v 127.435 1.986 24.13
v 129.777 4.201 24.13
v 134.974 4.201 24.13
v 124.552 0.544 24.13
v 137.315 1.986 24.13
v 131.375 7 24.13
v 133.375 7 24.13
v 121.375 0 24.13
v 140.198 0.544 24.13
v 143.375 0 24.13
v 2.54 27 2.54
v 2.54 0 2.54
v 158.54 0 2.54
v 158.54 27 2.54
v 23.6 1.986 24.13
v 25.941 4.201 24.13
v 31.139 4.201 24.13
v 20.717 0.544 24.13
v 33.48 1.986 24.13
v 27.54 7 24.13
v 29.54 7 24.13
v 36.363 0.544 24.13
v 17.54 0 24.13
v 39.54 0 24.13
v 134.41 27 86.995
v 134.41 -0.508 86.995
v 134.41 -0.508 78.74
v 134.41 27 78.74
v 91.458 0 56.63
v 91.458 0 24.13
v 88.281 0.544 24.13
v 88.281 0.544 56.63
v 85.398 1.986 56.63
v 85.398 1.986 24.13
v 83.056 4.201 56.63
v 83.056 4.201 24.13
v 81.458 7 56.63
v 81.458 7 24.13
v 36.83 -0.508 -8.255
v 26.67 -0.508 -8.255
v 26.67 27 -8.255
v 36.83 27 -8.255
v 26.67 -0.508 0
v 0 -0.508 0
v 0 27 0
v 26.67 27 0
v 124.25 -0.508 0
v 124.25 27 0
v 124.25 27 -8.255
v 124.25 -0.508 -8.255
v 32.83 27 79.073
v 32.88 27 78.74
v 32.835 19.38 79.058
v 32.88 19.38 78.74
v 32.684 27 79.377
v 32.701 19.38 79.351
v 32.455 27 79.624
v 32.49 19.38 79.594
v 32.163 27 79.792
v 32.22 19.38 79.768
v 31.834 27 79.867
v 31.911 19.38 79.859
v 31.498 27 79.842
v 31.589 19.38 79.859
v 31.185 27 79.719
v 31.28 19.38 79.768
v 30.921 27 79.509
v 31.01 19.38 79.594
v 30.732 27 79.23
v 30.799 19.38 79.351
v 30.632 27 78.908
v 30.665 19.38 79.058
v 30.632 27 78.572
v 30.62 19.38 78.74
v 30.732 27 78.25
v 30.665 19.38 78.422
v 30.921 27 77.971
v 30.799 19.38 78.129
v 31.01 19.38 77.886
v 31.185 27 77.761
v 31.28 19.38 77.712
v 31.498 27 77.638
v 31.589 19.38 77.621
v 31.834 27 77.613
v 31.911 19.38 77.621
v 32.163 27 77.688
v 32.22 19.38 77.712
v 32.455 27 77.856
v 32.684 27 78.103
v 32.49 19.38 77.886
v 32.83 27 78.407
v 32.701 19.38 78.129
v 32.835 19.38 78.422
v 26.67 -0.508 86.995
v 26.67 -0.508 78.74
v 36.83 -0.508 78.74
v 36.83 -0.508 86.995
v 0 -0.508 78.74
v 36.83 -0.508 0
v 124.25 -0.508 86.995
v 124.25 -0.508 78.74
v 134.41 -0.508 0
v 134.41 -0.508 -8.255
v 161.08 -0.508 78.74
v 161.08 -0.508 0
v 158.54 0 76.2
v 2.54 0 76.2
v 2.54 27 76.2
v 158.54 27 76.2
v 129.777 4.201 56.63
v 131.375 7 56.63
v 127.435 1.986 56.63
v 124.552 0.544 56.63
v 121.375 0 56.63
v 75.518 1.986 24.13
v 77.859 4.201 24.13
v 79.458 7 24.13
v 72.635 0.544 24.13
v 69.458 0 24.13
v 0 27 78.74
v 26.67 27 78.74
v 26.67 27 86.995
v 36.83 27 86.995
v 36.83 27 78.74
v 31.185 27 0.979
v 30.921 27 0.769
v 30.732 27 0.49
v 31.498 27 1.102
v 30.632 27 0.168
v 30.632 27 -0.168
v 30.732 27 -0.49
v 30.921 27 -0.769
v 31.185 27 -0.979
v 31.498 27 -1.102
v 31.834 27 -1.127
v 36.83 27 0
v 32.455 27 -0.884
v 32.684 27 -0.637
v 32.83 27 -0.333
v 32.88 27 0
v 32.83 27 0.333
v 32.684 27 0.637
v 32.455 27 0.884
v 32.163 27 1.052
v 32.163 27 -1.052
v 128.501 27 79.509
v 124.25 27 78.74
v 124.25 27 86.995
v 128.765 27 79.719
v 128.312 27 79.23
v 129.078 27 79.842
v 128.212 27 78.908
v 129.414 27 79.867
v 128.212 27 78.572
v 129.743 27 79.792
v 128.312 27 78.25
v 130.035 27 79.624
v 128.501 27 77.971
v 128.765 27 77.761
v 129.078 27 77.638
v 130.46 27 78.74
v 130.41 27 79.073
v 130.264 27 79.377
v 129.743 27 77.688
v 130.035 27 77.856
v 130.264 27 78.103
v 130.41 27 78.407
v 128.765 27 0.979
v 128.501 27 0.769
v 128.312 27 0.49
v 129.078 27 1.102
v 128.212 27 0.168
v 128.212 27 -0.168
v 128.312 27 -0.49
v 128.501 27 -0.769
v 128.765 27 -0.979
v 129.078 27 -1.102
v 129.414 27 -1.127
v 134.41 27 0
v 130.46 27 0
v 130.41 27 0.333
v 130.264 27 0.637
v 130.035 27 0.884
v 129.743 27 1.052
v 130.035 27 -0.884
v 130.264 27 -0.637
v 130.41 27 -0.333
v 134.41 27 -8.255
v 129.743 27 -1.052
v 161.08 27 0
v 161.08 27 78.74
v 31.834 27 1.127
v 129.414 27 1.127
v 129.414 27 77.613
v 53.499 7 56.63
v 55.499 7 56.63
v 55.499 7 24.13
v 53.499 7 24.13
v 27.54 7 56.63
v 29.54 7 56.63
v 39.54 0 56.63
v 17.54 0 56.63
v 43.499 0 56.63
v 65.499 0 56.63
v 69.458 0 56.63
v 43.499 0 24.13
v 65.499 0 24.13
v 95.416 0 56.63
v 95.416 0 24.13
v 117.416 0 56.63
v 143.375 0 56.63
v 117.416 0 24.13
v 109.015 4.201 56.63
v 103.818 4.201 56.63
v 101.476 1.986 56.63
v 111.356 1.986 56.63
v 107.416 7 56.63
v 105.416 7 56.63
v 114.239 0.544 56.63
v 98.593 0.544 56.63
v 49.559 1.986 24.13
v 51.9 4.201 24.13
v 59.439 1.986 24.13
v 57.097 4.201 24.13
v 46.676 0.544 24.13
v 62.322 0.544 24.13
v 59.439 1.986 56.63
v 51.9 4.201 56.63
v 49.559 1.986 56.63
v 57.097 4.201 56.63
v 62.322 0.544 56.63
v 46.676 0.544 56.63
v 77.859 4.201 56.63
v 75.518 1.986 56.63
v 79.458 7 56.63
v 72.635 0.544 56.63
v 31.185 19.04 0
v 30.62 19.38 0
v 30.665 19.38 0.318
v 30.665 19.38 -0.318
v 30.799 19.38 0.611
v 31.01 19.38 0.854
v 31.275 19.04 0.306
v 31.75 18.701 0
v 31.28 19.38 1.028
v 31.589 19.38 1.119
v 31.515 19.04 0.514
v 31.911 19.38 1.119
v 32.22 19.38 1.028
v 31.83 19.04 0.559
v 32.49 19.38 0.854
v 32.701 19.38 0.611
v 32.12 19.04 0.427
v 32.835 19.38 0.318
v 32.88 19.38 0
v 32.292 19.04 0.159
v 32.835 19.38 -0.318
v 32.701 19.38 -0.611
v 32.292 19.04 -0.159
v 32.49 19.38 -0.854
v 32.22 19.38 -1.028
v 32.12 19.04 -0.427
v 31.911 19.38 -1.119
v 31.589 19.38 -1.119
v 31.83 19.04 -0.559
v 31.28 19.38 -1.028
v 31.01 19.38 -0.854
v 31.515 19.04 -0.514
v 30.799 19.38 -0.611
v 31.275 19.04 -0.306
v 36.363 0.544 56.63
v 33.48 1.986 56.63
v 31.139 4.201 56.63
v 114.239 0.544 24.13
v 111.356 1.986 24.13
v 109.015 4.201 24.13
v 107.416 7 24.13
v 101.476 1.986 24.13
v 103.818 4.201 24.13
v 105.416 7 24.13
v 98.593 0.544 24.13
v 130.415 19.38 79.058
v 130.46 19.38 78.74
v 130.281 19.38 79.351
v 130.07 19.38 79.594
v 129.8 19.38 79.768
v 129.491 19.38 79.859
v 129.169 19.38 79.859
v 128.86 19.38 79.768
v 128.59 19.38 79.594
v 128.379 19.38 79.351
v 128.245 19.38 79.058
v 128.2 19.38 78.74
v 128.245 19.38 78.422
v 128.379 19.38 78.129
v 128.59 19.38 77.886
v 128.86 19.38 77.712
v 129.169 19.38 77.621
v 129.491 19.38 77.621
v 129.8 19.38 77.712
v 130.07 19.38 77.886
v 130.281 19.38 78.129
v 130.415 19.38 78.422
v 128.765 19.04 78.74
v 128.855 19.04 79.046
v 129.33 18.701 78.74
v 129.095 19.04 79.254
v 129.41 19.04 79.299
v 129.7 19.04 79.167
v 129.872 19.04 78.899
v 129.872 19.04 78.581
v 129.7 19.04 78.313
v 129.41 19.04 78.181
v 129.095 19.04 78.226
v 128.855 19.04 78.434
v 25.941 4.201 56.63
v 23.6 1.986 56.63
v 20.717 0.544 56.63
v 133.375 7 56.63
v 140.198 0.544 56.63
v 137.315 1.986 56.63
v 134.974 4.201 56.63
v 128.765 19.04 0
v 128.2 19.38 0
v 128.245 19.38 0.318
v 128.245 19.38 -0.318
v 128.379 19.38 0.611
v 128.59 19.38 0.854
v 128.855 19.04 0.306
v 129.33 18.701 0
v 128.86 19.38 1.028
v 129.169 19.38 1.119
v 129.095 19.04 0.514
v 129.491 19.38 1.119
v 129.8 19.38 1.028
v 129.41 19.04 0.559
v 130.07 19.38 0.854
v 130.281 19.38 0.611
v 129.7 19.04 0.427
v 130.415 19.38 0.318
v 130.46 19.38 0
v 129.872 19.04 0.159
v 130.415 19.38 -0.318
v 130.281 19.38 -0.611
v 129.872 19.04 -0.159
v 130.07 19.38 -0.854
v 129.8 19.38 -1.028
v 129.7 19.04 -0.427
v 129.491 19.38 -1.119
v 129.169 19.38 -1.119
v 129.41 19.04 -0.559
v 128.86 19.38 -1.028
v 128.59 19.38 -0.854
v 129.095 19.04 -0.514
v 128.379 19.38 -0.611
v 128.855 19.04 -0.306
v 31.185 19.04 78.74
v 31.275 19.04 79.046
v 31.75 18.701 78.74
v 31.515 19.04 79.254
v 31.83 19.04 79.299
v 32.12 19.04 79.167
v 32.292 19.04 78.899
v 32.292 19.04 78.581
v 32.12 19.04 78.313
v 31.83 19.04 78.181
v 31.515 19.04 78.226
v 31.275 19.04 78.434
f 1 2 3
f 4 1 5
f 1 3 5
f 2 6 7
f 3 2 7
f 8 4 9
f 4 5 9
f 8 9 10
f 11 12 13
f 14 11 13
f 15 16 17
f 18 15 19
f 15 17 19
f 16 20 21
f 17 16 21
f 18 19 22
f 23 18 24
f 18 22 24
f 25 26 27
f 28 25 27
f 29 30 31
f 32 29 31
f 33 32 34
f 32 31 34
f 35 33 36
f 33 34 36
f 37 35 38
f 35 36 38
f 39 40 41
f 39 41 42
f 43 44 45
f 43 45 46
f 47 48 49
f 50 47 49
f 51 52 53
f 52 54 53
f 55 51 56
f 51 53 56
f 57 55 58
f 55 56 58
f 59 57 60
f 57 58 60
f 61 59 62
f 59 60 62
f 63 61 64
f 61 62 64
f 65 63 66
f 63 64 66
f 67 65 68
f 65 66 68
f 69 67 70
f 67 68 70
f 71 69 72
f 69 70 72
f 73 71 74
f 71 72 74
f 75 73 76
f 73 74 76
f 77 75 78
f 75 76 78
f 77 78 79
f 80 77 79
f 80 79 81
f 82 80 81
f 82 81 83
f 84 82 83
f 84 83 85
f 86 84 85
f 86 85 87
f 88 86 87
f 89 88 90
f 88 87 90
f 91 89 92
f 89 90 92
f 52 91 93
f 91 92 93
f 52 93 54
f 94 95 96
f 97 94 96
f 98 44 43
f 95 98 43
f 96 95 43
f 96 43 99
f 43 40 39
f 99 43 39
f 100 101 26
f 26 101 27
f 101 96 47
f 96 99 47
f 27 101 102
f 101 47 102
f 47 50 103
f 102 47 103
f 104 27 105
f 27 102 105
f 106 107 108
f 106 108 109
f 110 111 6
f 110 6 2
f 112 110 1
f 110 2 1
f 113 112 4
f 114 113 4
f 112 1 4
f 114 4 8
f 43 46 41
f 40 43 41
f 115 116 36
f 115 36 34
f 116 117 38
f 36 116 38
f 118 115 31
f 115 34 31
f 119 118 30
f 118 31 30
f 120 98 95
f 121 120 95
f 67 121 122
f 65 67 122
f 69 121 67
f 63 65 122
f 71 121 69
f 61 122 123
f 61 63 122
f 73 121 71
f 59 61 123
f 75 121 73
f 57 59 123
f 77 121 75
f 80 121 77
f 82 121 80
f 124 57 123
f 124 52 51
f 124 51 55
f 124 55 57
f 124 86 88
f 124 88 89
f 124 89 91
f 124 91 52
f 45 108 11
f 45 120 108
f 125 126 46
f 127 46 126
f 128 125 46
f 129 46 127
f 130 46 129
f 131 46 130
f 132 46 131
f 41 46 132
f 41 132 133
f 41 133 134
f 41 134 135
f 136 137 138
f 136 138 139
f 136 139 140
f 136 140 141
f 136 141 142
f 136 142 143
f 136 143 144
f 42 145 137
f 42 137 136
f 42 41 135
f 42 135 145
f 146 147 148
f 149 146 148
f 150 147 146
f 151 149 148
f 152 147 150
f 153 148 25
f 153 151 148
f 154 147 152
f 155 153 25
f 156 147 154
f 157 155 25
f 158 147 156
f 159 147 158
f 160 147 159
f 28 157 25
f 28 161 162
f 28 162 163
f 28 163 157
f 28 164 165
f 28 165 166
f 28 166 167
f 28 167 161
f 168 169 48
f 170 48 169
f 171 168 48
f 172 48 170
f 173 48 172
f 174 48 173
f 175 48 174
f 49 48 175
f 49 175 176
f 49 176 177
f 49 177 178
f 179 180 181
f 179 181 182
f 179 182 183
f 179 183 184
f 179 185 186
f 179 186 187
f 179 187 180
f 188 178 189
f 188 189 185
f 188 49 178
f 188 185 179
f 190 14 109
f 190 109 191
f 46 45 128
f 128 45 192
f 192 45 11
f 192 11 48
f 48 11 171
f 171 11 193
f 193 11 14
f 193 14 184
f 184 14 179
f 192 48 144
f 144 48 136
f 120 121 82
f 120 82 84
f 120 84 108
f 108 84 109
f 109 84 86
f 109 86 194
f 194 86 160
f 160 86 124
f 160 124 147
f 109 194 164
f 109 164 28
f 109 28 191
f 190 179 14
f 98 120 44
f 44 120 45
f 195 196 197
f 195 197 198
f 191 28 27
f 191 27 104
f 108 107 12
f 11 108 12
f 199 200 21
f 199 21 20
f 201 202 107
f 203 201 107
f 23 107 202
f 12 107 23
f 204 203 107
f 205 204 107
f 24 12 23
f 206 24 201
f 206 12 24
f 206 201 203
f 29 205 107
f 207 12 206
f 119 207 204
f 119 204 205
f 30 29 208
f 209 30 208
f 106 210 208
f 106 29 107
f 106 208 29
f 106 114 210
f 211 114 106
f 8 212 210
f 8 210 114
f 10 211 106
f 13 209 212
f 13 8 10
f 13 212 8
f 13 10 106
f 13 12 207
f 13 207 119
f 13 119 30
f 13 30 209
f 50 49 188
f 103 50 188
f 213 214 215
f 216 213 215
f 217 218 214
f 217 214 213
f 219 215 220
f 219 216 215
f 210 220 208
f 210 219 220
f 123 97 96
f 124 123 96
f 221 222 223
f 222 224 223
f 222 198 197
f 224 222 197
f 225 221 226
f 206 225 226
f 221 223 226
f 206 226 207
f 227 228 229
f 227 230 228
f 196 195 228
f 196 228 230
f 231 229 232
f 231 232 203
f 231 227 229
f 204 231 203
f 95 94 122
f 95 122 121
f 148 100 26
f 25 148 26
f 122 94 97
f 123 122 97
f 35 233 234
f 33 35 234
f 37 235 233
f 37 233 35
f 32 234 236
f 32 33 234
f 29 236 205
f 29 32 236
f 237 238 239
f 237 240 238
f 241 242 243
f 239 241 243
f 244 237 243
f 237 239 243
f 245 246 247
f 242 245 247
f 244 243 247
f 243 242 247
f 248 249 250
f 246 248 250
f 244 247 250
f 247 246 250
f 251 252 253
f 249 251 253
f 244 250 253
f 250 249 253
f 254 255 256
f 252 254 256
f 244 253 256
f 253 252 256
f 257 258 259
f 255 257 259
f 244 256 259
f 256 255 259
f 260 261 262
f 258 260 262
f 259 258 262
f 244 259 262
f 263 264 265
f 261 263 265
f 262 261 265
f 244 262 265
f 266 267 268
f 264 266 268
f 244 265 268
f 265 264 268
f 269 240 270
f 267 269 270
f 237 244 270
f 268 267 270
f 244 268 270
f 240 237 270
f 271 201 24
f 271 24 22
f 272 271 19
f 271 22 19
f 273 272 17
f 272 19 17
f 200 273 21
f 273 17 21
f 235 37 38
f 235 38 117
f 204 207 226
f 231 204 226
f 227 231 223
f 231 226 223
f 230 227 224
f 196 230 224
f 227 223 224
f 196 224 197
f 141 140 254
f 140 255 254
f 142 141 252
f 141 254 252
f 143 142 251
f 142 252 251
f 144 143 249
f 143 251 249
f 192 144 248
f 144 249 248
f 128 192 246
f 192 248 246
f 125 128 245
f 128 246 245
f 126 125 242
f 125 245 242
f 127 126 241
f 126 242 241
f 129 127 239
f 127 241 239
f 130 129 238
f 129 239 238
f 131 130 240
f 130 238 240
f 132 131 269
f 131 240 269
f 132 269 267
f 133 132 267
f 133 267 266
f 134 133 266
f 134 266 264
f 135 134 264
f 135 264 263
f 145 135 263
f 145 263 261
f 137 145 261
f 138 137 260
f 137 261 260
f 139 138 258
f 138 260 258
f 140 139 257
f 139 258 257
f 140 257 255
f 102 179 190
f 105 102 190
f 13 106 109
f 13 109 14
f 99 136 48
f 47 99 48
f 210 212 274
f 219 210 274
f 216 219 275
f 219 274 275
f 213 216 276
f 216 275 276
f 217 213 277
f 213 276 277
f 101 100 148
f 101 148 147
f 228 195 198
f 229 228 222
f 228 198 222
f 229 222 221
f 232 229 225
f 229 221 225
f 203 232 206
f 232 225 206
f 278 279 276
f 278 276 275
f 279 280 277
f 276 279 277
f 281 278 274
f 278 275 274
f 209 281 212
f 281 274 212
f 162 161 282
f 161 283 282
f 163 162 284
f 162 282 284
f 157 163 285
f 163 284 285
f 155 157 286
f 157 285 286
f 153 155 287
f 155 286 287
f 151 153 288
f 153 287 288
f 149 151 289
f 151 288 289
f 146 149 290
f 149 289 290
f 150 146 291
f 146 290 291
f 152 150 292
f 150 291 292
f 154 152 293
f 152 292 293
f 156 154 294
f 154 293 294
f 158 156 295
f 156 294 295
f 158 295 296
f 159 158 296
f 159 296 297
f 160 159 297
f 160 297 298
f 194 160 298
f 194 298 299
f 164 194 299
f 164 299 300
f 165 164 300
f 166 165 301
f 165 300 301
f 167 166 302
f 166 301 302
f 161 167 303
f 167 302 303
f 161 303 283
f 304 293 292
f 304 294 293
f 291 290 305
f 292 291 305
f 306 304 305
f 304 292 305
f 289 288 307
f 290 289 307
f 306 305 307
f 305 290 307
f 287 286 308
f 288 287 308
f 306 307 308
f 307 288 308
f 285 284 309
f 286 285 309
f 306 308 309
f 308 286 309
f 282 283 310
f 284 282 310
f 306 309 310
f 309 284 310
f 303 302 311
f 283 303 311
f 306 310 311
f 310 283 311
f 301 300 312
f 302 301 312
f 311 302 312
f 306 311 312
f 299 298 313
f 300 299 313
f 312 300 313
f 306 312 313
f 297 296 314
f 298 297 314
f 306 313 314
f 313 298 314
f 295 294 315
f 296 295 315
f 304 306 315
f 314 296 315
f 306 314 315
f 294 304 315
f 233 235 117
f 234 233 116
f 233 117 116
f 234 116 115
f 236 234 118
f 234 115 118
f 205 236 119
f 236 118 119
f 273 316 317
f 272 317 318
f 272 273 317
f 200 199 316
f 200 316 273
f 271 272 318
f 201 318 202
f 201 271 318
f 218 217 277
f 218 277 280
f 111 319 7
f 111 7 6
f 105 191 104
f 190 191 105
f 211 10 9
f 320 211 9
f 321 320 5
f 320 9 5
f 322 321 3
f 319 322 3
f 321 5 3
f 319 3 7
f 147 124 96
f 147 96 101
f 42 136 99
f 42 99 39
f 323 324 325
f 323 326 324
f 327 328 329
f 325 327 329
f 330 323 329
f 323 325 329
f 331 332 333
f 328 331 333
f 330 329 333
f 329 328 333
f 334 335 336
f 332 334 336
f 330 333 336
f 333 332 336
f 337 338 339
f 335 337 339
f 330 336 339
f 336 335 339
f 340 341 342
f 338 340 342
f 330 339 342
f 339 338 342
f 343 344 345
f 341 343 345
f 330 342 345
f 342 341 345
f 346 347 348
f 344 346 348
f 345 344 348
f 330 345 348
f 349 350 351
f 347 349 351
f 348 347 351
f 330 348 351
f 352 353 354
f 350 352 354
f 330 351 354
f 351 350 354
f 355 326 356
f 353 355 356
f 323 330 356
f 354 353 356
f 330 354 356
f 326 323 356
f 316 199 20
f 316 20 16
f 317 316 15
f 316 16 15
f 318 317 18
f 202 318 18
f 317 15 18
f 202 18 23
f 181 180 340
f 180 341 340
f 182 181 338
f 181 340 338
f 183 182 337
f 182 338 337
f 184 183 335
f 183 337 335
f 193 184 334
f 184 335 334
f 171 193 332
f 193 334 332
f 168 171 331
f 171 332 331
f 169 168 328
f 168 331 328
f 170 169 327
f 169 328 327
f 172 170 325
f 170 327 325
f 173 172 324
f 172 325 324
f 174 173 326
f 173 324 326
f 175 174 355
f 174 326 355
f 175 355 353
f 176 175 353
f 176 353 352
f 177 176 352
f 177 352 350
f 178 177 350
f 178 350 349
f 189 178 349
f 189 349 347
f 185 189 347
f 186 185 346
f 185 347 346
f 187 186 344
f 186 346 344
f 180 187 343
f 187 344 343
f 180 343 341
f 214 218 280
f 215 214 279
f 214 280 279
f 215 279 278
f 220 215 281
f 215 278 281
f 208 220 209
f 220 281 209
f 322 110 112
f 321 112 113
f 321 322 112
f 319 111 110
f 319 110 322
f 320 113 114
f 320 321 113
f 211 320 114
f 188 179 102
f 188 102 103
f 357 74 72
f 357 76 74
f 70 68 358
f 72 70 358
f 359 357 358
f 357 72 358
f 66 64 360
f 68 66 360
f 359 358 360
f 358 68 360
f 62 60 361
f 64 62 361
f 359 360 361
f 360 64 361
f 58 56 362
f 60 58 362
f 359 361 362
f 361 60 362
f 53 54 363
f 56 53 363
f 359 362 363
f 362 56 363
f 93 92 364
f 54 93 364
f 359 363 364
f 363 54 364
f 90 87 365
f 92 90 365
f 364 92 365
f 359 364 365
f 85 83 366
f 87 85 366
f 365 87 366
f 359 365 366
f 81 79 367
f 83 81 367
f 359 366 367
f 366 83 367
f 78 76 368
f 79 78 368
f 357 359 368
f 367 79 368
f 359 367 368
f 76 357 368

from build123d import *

# Parameters (mm, degrees)
SKETCH1_W                 = 161.08
SKETCH1_H                 = 78.74
BOSS_EXTRUDE1_DEPTH       = 0.508
SKETCH1_3_W               = 161.08
SKETCH1_3_H               = 8.255
SKETCH1_3_H_2             = 78.74
SKETCH1_3_W_2             = 156
SKETCH1_3_H_3             = 73.66
BOSS_EXTRUDE2_DEPTH       = 27
BOSS_EXTRUDE3_START       = 21.59
BOSS_EXTRUDE3_DEPTH       = 32.5
SKETCH1_4_W               = 161.08
SKETCH1_4_H               = 8.255
BOSS_EXTRUDE4_DEPTH       = 0.508
F_4_40_TAPPED_HOLE2_D     = 2.2606
F_4_40_TAPPED_HOLE2_DEPTH = 7.62
F_4_40_TAPPED_HOLE2_TIP   = 0.679152758
SKETCH11_W                = 87.42
SKETCH11_H                = 8.255
SKETCH11_W_2              = 26.67
CUT_EXTRUDE1_DEPTH        = 28.508


with BuildPart() as part:
    # Sketch1 → Boss-Extrude1 (new body)
    with BuildSketch(Plane(origin=(0, 0, 0), x_dir=(1, 0, 0), z_dir=(0, 1, 0))):
        with Locations((80.54, -39.37)):
            Rectangle(SKETCH1_W, SKETCH1_H)
    extrude(amount=-BOSS_EXTRUDE1_DEPTH)

    # Sketch1<3> → Boss-Extrude2 (add)
    with BuildSketch(Plane(origin=(0, 0, 0), x_dir=(1, 0, 0), z_dir=(0, 1, 0))):
        with Locations((80.54, 4.1275)):
            Rectangle(SKETCH1_3_W, SKETCH1_3_H)
        with Locations((80.54, -82.8675)):
            Rectangle(SKETCH1_3_W, SKETCH1_3_H)
        with Locations((80.54, -39.37)):
            Rectangle(SKETCH1_3_W, SKETCH1_3_H_2)
        with Locations((80.54, -39.37)):
            Rectangle(SKETCH1_3_W_2, SKETCH1_3_H_3, mode=Mode.SUBTRACT)
    extrude(amount=BOSS_EXTRUDE2_DEPTH)

    # Sketch5 → Boss-Extrude3 (add)
    with BuildSketch(Plane.XY.offset(2.54).offset(BOSS_EXTRUDE3_START)):
        with BuildLine():
            Line((29.54, 7), (27.54, 7))
            ThreePointArc((27.54, 7), (23.600043647, 1.985651932), (17.54, 0))
            Line((17.54, 0), (39.54, 0))
            ThreePointArc((39.54, 0), (33.479956353, 1.985651932), (29.54, 7))
        make_face()
        with BuildLine():
            Line((55.4988, 7), (53.4988, 7))
            ThreePointArc((53.4988, 7), (49.558843647, 1.985651932), (43.4988, 0))
            Line((43.4988, 0), (65.4988, 0))
            ThreePointArc((65.4988, 0), (59.438756353, 1.985651932), (55.4988, 7))
        make_face()
        with BuildLine():
            Line((81.4576, 7), (79.4576, 7))
            ThreePointArc((79.4576, 7), (75.517643647, 1.985651932), (69.4576, 0))
            Line((69.4576, 0), (91.4576, 0))
            ThreePointArc((91.4576, 0), (85.397556353, 1.985651932), (81.4576, 7))
        make_face()
        with BuildLine():
            Line((107.4164, 7), (105.4164, 7))
            ThreePointArc((105.4164, 7), (101.476443647, 1.985651932), (95.4164, 0))
            Line((95.4164, 0), (117.4164, 0))
            ThreePointArc((117.4164, 0), (111.356356353, 1.985651932), (107.4164, 7))
        make_face()
        with BuildLine():
            Line((133.3752, 7), (131.3752, 7))
            ThreePointArc((131.3752, 7), (127.435243647, 1.985651932), (121.3752, 0))
            Line((121.3752, 0), (143.3752, 0))
            ThreePointArc((143.3752, 0), (137.315156353, 1.985651932), (133.3752, 7))
        make_face()
    extrude(amount=BOSS_EXTRUDE3_DEPTH)

    # Sketch1<4> → Boss-Extrude4 (add)
    with BuildSketch(Plane(origin=(0, 0, 0), x_dir=(1, 0, 0), z_dir=(0, 1, 0))):
        with Locations((80.54, 4.1275)):
            Rectangle(SKETCH1_4_W, SKETCH1_4_H)
        with Locations((80.54, -82.8675)):
            Rectangle(SKETCH1_4_W, SKETCH1_4_H)
    extrude(amount=-BOSS_EXTRUDE4_DEPTH)

    # #4-40 Tapped Hole2
    with Locations(Plane(origin=(0, 27, 0), x_dir=(-1, 0, 0), z_dir=(0, 1, 0))):
        with Locations((-31.75, 0), (-129.33, 0), (-31.75, 78.74), (-129.33, 78.74)):
            Hole(F_4_40_TAPPED_HOLE2_D / 2, depth=F_4_40_TAPPED_HOLE2_DEPTH)
            with Locations((0, 0, -(F_4_40_TAPPED_HOLE2_DEPTH + F_4_40_TAPPED_HOLE2_TIP / 2))):  # 118° drill point
                Cone(0, F_4_40_TAPPED_HOLE2_D / 2, F_4_40_TAPPED_HOLE2_TIP, mode=Mode.SUBTRACT)

    # Sketch11 → Cut-Extrude1 (cut, through all)
    with BuildSketch(Plane(origin=(0, 27, 0), x_dir=(1, 0, 0), z_dir=(0, 1, 0))):
        with Locations((80.54, 4.1275)):
            Rectangle(SKETCH11_W, SKETCH11_H)
        with Locations((80.54, -82.8675)):
            Rectangle(SKETCH11_W, SKETCH11_H)
        with Locations((13.335, 4.1275)):
            Rectangle(SKETCH11_W_2, SKETCH11_H)
        with Locations((147.745, 4.1275)):
            Rectangle(SKETCH11_W_2, SKETCH11_H)
        with Locations((147.745, -82.8675)):
            Rectangle(SKETCH11_W_2, SKETCH11_H)
        with Locations((13.335, -82.8675)):
            Rectangle(SKETCH11_W_2, SKETCH11_H)
    extrude(amount=-CUT_EXTRUDE1_DEPTH, mode=Mode.SUBTRACT)


solid = part.part
